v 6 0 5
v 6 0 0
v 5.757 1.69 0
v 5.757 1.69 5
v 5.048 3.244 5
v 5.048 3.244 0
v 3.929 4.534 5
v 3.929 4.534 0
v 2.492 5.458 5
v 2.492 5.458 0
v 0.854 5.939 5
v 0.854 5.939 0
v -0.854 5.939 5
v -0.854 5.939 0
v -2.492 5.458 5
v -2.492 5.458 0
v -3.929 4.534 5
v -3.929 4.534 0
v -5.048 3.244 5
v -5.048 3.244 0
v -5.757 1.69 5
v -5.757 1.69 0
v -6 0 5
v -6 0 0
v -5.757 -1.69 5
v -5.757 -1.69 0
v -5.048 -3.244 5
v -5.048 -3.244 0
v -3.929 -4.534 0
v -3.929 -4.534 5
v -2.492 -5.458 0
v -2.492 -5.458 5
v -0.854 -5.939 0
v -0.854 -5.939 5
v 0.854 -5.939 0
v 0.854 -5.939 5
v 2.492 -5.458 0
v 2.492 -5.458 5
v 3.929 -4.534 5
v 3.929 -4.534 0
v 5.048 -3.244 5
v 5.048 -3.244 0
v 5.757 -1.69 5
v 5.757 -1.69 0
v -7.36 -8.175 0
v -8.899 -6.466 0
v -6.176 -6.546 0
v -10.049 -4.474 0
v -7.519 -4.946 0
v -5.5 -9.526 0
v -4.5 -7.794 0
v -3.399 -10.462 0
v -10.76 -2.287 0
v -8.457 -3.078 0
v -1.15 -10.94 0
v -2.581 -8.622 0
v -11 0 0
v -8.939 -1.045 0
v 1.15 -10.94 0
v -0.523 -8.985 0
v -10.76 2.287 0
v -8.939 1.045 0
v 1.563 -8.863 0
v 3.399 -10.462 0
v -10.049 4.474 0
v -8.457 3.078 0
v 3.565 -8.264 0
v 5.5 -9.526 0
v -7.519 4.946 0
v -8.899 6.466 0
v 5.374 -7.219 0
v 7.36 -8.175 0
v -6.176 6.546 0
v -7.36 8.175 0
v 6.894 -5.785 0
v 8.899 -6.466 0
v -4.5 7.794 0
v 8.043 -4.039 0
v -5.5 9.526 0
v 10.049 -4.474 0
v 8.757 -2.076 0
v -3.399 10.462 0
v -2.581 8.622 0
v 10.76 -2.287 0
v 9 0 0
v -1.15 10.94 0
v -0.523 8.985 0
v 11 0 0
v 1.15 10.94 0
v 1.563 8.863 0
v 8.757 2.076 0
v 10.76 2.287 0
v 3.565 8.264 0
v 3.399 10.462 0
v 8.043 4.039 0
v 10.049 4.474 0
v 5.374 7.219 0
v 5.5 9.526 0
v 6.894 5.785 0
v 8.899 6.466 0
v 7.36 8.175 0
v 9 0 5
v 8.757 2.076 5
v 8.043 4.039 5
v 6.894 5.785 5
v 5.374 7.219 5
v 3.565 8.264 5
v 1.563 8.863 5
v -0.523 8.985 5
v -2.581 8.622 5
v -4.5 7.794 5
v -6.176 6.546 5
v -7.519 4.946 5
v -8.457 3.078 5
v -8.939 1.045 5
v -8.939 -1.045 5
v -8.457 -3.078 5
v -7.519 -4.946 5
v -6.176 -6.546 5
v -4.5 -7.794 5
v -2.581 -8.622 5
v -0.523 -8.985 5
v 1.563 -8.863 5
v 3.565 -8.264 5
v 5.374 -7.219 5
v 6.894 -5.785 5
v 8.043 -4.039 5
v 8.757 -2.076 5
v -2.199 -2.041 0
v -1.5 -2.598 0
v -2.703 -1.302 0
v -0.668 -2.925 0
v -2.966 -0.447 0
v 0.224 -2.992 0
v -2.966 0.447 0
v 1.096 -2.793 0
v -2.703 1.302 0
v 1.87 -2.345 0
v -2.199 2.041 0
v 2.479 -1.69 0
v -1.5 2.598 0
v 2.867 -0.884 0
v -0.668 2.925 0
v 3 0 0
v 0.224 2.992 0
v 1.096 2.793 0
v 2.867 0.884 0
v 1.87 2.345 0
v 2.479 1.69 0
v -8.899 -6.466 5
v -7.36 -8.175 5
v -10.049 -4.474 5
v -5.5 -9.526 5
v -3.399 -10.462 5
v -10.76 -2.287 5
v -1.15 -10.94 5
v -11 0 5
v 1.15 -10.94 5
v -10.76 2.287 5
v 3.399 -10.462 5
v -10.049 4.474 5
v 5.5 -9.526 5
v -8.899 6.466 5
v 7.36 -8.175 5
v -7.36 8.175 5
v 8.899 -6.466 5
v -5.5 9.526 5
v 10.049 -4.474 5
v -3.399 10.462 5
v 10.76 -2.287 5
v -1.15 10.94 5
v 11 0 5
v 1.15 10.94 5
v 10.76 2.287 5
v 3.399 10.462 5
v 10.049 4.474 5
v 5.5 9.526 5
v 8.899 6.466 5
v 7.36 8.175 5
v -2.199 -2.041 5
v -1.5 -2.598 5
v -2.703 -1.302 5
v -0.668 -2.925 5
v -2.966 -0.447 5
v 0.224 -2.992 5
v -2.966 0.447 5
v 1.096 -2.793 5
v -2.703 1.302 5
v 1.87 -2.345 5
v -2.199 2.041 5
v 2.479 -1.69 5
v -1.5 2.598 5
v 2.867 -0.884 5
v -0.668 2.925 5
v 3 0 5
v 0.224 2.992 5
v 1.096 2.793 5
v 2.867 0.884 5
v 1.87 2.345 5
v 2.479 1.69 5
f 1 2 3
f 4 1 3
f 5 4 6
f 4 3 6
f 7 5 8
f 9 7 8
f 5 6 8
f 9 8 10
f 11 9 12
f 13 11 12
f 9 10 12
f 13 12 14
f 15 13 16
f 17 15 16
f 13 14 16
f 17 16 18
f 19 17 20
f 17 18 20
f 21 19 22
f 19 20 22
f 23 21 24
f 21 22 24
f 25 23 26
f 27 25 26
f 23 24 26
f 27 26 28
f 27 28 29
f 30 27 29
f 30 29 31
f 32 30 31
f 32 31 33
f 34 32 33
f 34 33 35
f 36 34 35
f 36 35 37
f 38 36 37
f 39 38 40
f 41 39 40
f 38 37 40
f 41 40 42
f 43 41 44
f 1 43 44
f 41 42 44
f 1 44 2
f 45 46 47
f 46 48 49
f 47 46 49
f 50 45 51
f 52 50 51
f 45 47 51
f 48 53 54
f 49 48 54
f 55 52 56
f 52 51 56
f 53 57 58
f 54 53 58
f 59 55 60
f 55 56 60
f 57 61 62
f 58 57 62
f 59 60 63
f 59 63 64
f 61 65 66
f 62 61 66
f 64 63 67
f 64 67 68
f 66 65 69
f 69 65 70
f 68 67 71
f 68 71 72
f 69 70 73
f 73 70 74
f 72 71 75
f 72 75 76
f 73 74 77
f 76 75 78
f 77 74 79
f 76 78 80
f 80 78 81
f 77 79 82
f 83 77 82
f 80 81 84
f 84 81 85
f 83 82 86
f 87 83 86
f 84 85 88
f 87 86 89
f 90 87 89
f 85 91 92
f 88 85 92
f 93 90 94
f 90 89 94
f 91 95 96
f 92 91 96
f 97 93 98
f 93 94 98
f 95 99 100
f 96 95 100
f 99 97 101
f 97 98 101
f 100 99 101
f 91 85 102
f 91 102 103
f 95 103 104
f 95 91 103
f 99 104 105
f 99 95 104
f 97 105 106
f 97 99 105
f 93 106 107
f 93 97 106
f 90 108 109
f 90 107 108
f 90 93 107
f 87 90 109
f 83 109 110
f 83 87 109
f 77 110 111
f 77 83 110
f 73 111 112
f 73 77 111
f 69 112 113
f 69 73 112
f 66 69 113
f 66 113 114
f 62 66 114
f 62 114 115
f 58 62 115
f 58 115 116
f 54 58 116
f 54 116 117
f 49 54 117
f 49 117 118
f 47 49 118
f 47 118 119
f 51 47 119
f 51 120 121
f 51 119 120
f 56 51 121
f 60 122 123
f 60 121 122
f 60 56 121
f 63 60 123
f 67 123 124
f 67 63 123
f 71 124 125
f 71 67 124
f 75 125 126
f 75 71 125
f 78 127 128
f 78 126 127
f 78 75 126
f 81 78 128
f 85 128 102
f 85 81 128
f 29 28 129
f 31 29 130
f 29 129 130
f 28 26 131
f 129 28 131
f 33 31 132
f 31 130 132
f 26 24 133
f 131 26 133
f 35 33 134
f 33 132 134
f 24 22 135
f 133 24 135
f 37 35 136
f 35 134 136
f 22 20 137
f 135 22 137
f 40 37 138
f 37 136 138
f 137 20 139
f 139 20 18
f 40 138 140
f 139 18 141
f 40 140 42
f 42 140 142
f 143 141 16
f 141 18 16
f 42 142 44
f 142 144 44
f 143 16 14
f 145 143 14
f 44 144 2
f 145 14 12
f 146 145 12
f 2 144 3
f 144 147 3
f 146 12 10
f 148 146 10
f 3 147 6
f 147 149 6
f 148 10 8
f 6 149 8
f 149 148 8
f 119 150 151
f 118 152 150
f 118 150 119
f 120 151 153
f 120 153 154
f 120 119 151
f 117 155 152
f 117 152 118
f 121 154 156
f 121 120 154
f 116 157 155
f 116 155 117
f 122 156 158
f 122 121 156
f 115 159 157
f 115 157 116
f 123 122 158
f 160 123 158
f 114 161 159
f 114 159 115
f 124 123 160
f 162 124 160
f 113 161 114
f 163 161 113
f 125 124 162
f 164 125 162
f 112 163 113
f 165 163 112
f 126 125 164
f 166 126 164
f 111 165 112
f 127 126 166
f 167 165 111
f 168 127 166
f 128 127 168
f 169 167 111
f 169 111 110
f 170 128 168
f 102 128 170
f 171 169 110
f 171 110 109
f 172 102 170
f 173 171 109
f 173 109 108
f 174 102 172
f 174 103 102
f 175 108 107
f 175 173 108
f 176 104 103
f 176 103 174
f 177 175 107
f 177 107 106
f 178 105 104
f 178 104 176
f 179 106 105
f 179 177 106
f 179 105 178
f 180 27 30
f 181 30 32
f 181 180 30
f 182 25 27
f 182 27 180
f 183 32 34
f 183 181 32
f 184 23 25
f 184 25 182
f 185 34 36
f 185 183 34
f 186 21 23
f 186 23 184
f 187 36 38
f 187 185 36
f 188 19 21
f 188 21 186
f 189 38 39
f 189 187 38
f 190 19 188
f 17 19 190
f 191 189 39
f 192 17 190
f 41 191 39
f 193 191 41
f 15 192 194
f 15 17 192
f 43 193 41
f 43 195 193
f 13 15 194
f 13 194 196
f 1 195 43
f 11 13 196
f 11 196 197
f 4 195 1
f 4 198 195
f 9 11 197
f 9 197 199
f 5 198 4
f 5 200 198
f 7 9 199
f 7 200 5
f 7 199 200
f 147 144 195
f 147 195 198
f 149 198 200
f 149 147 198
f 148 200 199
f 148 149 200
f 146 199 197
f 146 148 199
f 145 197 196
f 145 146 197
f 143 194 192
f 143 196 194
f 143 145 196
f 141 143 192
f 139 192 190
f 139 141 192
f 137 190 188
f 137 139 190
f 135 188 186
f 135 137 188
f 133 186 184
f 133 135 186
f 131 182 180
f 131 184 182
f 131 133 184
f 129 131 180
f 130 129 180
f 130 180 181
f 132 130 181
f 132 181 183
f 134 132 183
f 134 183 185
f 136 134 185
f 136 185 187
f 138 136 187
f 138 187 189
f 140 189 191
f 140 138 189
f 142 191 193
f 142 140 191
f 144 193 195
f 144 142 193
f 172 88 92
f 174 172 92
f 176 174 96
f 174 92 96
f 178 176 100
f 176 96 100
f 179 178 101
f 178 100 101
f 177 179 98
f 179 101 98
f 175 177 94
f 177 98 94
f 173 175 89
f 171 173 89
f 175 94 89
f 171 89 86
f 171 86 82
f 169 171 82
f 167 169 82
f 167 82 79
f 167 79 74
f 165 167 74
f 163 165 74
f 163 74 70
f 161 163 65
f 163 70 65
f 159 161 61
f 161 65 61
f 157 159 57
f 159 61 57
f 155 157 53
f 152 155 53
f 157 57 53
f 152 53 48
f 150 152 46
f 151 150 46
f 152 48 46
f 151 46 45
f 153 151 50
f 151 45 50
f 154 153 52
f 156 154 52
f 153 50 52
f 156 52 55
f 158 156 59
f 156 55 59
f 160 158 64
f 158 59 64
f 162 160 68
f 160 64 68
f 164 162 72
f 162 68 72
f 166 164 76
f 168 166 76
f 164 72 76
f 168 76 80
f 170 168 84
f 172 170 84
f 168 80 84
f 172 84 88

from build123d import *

# Parameters (mm, degrees)
CYLINDER001_R     = 9
CYLINDER001_DEPTH = 10
CYLINDER_R        = 11
CYLINDER_DEPTH    = 5
CYLINDER003_R     = 3
CYLINDER003_DEPTH = 10
CYLINDER002_R     = 6
CYLINDER002_DEPTH = 5


with BuildPart() as cylinder001:
    # Cylinder001 → Cylinder001 (new body)
    with BuildSketch(Plane.XY):
        Circle(CYLINDER001_R)
    extrude(amount=CYLINDER001_DEPTH)


with BuildPart() as cut:
    # Cylinder → Cylinder (new body)
    with BuildSketch(Plane.XY):
        Circle(CYLINDER_R)
    extrude(amount=CYLINDER_DEPTH)

    # Cut: cut Cylinder001
    add(cylinder001.part, mode=Mode.SUBTRACT)


with BuildPart() as cylinder003:
    # Cylinder003 → Cylinder003 (new body)
    with BuildSketch(Plane.XY.offset(-1)):
        Circle(CYLINDER003_R)
    extrude(amount=CYLINDER003_DEPTH)


with BuildPart() as cut001:
    # Cylinder002 → Cylinder002 (new body)
    with BuildSketch(Plane.XY):
        Circle(CYLINDER002_R)
    extrude(amount=CYLINDER002_DEPTH)

    # Cut001: cut Cylinder003
    add(cylinder003.part, mode=Mode.SUBTRACT)


solid = Compound([cut.part, cut001.part])
